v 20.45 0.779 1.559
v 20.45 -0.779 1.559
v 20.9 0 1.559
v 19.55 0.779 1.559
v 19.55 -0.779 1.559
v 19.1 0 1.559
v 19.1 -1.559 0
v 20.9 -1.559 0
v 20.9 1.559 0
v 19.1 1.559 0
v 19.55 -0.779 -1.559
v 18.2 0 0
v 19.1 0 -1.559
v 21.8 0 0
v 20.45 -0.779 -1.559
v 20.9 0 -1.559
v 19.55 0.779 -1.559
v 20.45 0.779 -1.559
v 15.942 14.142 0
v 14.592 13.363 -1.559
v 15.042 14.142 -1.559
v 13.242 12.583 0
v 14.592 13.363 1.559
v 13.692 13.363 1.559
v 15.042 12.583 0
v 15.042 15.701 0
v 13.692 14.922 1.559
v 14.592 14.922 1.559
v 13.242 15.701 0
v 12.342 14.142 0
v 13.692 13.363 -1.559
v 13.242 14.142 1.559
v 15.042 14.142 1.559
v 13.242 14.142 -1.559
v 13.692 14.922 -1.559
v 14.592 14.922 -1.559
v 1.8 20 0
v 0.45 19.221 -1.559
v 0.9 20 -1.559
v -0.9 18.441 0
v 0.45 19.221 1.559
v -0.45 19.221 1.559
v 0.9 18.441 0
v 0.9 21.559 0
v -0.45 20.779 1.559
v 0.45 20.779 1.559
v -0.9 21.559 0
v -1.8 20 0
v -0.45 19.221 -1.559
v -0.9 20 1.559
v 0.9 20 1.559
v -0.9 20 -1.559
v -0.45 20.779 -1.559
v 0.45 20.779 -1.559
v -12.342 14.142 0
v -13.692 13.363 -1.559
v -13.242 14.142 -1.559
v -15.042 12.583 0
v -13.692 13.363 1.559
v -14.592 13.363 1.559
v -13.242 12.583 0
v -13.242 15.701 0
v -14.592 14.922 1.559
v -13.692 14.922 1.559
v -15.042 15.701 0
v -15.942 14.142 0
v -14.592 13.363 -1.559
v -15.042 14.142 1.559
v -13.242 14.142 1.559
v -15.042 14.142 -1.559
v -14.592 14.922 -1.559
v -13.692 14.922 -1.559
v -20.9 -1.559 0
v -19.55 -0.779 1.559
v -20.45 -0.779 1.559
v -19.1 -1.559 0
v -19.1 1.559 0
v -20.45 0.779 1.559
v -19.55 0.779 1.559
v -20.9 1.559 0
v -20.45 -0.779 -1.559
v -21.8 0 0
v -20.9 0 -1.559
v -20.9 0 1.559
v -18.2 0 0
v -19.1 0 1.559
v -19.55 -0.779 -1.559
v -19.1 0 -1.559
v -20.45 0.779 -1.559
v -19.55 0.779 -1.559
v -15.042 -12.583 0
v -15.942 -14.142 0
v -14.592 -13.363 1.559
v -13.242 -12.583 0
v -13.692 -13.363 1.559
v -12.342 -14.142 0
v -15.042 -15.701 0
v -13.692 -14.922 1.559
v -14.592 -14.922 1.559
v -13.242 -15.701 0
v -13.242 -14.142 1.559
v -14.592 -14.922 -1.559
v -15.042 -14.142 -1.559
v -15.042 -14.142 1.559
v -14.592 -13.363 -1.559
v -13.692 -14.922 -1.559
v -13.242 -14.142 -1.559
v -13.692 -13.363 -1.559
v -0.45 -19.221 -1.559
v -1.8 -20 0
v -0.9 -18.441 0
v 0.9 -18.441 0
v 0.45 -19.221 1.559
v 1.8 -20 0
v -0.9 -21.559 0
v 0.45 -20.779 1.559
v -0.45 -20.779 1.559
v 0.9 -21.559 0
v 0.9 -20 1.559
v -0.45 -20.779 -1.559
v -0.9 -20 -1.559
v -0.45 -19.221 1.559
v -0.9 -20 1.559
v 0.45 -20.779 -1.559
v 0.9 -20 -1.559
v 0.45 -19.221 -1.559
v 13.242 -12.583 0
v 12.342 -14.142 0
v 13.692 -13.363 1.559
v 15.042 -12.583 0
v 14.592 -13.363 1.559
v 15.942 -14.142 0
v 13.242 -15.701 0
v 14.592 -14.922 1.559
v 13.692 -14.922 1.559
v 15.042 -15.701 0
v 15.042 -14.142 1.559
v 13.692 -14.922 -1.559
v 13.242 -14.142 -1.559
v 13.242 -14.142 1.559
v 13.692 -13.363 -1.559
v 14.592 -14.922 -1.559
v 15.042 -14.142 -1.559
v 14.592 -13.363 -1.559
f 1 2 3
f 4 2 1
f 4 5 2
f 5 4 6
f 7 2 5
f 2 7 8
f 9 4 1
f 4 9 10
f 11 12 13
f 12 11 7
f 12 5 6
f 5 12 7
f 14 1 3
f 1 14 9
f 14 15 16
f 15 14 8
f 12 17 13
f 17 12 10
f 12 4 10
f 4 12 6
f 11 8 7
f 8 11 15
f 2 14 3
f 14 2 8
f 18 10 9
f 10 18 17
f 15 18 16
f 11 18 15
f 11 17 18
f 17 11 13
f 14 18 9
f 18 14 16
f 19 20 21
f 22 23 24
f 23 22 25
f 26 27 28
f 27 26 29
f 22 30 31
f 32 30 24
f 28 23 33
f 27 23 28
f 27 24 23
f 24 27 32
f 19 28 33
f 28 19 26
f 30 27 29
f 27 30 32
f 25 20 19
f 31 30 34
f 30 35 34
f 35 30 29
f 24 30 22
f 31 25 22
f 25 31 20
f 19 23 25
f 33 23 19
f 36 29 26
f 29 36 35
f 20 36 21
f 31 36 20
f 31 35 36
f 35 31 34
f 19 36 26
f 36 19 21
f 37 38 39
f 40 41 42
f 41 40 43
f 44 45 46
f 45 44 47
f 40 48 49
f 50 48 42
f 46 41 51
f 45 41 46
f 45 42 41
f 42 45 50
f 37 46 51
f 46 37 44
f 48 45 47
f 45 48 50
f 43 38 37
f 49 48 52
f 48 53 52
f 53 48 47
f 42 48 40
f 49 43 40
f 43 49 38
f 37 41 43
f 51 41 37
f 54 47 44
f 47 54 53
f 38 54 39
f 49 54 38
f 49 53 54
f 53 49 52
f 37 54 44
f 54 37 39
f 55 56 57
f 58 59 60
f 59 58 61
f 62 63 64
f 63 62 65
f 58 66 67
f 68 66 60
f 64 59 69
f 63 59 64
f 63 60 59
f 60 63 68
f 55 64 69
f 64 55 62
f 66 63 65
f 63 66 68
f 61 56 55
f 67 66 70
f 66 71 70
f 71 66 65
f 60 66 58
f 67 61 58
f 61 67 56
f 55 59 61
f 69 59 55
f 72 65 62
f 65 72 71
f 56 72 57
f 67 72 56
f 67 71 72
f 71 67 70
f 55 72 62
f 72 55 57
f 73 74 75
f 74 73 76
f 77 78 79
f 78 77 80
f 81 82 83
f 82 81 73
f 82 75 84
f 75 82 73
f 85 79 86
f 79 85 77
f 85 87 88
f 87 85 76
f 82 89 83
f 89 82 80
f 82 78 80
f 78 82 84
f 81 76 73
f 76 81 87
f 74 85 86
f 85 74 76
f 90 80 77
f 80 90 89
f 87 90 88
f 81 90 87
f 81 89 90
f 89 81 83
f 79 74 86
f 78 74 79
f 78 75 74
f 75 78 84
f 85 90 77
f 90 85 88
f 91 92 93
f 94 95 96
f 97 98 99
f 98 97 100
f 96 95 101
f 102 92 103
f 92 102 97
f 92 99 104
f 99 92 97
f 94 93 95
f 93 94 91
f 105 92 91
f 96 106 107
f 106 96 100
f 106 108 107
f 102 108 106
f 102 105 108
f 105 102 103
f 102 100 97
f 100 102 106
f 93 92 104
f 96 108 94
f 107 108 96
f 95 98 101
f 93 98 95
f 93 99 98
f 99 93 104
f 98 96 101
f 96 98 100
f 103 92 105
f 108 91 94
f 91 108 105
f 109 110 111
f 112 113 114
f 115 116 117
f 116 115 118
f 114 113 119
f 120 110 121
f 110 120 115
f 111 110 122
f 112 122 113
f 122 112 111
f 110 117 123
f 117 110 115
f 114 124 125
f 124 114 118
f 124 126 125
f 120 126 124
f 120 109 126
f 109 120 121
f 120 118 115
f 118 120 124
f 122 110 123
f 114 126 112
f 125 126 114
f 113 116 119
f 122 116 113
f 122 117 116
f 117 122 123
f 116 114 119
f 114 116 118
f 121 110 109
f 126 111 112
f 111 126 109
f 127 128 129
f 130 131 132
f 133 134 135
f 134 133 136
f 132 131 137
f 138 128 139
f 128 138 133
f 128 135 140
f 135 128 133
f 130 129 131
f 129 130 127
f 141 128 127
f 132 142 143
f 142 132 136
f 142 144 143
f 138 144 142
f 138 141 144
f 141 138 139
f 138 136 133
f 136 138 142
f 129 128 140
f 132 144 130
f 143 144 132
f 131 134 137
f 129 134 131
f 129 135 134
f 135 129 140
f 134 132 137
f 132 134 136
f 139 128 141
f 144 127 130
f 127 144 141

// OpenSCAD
// User functions, recursion, expressions, list comprehensions, builtins.
// Exercises: function definitions, recursion (fib), ternary, let(),
// list comprehension over a range, vector indexing and .x/.y swizzles,
// and the builtins sin/cos/len/concat/norm/sqrt.

function fib(n) = n < 2 ? n : fib(n - 1) + fib(n - 2);
function ring(n, r) = [ for (i = [0 : n - 1]) let(a = i * 360 / n) [r * cos(a), r * sin(a)] ];

pts = ring(8, 20);
echo(count = len(pts), first = pts[0], firstx = pts[0].x);

for (p = pts)
    translate([p.x, p.y, 0]) sphere(r = 1 + fib(3) * 0.4);

dir = concat([1, 0], [0]);
echo(unit_len = norm(dir), root2 = sqrt(2));
